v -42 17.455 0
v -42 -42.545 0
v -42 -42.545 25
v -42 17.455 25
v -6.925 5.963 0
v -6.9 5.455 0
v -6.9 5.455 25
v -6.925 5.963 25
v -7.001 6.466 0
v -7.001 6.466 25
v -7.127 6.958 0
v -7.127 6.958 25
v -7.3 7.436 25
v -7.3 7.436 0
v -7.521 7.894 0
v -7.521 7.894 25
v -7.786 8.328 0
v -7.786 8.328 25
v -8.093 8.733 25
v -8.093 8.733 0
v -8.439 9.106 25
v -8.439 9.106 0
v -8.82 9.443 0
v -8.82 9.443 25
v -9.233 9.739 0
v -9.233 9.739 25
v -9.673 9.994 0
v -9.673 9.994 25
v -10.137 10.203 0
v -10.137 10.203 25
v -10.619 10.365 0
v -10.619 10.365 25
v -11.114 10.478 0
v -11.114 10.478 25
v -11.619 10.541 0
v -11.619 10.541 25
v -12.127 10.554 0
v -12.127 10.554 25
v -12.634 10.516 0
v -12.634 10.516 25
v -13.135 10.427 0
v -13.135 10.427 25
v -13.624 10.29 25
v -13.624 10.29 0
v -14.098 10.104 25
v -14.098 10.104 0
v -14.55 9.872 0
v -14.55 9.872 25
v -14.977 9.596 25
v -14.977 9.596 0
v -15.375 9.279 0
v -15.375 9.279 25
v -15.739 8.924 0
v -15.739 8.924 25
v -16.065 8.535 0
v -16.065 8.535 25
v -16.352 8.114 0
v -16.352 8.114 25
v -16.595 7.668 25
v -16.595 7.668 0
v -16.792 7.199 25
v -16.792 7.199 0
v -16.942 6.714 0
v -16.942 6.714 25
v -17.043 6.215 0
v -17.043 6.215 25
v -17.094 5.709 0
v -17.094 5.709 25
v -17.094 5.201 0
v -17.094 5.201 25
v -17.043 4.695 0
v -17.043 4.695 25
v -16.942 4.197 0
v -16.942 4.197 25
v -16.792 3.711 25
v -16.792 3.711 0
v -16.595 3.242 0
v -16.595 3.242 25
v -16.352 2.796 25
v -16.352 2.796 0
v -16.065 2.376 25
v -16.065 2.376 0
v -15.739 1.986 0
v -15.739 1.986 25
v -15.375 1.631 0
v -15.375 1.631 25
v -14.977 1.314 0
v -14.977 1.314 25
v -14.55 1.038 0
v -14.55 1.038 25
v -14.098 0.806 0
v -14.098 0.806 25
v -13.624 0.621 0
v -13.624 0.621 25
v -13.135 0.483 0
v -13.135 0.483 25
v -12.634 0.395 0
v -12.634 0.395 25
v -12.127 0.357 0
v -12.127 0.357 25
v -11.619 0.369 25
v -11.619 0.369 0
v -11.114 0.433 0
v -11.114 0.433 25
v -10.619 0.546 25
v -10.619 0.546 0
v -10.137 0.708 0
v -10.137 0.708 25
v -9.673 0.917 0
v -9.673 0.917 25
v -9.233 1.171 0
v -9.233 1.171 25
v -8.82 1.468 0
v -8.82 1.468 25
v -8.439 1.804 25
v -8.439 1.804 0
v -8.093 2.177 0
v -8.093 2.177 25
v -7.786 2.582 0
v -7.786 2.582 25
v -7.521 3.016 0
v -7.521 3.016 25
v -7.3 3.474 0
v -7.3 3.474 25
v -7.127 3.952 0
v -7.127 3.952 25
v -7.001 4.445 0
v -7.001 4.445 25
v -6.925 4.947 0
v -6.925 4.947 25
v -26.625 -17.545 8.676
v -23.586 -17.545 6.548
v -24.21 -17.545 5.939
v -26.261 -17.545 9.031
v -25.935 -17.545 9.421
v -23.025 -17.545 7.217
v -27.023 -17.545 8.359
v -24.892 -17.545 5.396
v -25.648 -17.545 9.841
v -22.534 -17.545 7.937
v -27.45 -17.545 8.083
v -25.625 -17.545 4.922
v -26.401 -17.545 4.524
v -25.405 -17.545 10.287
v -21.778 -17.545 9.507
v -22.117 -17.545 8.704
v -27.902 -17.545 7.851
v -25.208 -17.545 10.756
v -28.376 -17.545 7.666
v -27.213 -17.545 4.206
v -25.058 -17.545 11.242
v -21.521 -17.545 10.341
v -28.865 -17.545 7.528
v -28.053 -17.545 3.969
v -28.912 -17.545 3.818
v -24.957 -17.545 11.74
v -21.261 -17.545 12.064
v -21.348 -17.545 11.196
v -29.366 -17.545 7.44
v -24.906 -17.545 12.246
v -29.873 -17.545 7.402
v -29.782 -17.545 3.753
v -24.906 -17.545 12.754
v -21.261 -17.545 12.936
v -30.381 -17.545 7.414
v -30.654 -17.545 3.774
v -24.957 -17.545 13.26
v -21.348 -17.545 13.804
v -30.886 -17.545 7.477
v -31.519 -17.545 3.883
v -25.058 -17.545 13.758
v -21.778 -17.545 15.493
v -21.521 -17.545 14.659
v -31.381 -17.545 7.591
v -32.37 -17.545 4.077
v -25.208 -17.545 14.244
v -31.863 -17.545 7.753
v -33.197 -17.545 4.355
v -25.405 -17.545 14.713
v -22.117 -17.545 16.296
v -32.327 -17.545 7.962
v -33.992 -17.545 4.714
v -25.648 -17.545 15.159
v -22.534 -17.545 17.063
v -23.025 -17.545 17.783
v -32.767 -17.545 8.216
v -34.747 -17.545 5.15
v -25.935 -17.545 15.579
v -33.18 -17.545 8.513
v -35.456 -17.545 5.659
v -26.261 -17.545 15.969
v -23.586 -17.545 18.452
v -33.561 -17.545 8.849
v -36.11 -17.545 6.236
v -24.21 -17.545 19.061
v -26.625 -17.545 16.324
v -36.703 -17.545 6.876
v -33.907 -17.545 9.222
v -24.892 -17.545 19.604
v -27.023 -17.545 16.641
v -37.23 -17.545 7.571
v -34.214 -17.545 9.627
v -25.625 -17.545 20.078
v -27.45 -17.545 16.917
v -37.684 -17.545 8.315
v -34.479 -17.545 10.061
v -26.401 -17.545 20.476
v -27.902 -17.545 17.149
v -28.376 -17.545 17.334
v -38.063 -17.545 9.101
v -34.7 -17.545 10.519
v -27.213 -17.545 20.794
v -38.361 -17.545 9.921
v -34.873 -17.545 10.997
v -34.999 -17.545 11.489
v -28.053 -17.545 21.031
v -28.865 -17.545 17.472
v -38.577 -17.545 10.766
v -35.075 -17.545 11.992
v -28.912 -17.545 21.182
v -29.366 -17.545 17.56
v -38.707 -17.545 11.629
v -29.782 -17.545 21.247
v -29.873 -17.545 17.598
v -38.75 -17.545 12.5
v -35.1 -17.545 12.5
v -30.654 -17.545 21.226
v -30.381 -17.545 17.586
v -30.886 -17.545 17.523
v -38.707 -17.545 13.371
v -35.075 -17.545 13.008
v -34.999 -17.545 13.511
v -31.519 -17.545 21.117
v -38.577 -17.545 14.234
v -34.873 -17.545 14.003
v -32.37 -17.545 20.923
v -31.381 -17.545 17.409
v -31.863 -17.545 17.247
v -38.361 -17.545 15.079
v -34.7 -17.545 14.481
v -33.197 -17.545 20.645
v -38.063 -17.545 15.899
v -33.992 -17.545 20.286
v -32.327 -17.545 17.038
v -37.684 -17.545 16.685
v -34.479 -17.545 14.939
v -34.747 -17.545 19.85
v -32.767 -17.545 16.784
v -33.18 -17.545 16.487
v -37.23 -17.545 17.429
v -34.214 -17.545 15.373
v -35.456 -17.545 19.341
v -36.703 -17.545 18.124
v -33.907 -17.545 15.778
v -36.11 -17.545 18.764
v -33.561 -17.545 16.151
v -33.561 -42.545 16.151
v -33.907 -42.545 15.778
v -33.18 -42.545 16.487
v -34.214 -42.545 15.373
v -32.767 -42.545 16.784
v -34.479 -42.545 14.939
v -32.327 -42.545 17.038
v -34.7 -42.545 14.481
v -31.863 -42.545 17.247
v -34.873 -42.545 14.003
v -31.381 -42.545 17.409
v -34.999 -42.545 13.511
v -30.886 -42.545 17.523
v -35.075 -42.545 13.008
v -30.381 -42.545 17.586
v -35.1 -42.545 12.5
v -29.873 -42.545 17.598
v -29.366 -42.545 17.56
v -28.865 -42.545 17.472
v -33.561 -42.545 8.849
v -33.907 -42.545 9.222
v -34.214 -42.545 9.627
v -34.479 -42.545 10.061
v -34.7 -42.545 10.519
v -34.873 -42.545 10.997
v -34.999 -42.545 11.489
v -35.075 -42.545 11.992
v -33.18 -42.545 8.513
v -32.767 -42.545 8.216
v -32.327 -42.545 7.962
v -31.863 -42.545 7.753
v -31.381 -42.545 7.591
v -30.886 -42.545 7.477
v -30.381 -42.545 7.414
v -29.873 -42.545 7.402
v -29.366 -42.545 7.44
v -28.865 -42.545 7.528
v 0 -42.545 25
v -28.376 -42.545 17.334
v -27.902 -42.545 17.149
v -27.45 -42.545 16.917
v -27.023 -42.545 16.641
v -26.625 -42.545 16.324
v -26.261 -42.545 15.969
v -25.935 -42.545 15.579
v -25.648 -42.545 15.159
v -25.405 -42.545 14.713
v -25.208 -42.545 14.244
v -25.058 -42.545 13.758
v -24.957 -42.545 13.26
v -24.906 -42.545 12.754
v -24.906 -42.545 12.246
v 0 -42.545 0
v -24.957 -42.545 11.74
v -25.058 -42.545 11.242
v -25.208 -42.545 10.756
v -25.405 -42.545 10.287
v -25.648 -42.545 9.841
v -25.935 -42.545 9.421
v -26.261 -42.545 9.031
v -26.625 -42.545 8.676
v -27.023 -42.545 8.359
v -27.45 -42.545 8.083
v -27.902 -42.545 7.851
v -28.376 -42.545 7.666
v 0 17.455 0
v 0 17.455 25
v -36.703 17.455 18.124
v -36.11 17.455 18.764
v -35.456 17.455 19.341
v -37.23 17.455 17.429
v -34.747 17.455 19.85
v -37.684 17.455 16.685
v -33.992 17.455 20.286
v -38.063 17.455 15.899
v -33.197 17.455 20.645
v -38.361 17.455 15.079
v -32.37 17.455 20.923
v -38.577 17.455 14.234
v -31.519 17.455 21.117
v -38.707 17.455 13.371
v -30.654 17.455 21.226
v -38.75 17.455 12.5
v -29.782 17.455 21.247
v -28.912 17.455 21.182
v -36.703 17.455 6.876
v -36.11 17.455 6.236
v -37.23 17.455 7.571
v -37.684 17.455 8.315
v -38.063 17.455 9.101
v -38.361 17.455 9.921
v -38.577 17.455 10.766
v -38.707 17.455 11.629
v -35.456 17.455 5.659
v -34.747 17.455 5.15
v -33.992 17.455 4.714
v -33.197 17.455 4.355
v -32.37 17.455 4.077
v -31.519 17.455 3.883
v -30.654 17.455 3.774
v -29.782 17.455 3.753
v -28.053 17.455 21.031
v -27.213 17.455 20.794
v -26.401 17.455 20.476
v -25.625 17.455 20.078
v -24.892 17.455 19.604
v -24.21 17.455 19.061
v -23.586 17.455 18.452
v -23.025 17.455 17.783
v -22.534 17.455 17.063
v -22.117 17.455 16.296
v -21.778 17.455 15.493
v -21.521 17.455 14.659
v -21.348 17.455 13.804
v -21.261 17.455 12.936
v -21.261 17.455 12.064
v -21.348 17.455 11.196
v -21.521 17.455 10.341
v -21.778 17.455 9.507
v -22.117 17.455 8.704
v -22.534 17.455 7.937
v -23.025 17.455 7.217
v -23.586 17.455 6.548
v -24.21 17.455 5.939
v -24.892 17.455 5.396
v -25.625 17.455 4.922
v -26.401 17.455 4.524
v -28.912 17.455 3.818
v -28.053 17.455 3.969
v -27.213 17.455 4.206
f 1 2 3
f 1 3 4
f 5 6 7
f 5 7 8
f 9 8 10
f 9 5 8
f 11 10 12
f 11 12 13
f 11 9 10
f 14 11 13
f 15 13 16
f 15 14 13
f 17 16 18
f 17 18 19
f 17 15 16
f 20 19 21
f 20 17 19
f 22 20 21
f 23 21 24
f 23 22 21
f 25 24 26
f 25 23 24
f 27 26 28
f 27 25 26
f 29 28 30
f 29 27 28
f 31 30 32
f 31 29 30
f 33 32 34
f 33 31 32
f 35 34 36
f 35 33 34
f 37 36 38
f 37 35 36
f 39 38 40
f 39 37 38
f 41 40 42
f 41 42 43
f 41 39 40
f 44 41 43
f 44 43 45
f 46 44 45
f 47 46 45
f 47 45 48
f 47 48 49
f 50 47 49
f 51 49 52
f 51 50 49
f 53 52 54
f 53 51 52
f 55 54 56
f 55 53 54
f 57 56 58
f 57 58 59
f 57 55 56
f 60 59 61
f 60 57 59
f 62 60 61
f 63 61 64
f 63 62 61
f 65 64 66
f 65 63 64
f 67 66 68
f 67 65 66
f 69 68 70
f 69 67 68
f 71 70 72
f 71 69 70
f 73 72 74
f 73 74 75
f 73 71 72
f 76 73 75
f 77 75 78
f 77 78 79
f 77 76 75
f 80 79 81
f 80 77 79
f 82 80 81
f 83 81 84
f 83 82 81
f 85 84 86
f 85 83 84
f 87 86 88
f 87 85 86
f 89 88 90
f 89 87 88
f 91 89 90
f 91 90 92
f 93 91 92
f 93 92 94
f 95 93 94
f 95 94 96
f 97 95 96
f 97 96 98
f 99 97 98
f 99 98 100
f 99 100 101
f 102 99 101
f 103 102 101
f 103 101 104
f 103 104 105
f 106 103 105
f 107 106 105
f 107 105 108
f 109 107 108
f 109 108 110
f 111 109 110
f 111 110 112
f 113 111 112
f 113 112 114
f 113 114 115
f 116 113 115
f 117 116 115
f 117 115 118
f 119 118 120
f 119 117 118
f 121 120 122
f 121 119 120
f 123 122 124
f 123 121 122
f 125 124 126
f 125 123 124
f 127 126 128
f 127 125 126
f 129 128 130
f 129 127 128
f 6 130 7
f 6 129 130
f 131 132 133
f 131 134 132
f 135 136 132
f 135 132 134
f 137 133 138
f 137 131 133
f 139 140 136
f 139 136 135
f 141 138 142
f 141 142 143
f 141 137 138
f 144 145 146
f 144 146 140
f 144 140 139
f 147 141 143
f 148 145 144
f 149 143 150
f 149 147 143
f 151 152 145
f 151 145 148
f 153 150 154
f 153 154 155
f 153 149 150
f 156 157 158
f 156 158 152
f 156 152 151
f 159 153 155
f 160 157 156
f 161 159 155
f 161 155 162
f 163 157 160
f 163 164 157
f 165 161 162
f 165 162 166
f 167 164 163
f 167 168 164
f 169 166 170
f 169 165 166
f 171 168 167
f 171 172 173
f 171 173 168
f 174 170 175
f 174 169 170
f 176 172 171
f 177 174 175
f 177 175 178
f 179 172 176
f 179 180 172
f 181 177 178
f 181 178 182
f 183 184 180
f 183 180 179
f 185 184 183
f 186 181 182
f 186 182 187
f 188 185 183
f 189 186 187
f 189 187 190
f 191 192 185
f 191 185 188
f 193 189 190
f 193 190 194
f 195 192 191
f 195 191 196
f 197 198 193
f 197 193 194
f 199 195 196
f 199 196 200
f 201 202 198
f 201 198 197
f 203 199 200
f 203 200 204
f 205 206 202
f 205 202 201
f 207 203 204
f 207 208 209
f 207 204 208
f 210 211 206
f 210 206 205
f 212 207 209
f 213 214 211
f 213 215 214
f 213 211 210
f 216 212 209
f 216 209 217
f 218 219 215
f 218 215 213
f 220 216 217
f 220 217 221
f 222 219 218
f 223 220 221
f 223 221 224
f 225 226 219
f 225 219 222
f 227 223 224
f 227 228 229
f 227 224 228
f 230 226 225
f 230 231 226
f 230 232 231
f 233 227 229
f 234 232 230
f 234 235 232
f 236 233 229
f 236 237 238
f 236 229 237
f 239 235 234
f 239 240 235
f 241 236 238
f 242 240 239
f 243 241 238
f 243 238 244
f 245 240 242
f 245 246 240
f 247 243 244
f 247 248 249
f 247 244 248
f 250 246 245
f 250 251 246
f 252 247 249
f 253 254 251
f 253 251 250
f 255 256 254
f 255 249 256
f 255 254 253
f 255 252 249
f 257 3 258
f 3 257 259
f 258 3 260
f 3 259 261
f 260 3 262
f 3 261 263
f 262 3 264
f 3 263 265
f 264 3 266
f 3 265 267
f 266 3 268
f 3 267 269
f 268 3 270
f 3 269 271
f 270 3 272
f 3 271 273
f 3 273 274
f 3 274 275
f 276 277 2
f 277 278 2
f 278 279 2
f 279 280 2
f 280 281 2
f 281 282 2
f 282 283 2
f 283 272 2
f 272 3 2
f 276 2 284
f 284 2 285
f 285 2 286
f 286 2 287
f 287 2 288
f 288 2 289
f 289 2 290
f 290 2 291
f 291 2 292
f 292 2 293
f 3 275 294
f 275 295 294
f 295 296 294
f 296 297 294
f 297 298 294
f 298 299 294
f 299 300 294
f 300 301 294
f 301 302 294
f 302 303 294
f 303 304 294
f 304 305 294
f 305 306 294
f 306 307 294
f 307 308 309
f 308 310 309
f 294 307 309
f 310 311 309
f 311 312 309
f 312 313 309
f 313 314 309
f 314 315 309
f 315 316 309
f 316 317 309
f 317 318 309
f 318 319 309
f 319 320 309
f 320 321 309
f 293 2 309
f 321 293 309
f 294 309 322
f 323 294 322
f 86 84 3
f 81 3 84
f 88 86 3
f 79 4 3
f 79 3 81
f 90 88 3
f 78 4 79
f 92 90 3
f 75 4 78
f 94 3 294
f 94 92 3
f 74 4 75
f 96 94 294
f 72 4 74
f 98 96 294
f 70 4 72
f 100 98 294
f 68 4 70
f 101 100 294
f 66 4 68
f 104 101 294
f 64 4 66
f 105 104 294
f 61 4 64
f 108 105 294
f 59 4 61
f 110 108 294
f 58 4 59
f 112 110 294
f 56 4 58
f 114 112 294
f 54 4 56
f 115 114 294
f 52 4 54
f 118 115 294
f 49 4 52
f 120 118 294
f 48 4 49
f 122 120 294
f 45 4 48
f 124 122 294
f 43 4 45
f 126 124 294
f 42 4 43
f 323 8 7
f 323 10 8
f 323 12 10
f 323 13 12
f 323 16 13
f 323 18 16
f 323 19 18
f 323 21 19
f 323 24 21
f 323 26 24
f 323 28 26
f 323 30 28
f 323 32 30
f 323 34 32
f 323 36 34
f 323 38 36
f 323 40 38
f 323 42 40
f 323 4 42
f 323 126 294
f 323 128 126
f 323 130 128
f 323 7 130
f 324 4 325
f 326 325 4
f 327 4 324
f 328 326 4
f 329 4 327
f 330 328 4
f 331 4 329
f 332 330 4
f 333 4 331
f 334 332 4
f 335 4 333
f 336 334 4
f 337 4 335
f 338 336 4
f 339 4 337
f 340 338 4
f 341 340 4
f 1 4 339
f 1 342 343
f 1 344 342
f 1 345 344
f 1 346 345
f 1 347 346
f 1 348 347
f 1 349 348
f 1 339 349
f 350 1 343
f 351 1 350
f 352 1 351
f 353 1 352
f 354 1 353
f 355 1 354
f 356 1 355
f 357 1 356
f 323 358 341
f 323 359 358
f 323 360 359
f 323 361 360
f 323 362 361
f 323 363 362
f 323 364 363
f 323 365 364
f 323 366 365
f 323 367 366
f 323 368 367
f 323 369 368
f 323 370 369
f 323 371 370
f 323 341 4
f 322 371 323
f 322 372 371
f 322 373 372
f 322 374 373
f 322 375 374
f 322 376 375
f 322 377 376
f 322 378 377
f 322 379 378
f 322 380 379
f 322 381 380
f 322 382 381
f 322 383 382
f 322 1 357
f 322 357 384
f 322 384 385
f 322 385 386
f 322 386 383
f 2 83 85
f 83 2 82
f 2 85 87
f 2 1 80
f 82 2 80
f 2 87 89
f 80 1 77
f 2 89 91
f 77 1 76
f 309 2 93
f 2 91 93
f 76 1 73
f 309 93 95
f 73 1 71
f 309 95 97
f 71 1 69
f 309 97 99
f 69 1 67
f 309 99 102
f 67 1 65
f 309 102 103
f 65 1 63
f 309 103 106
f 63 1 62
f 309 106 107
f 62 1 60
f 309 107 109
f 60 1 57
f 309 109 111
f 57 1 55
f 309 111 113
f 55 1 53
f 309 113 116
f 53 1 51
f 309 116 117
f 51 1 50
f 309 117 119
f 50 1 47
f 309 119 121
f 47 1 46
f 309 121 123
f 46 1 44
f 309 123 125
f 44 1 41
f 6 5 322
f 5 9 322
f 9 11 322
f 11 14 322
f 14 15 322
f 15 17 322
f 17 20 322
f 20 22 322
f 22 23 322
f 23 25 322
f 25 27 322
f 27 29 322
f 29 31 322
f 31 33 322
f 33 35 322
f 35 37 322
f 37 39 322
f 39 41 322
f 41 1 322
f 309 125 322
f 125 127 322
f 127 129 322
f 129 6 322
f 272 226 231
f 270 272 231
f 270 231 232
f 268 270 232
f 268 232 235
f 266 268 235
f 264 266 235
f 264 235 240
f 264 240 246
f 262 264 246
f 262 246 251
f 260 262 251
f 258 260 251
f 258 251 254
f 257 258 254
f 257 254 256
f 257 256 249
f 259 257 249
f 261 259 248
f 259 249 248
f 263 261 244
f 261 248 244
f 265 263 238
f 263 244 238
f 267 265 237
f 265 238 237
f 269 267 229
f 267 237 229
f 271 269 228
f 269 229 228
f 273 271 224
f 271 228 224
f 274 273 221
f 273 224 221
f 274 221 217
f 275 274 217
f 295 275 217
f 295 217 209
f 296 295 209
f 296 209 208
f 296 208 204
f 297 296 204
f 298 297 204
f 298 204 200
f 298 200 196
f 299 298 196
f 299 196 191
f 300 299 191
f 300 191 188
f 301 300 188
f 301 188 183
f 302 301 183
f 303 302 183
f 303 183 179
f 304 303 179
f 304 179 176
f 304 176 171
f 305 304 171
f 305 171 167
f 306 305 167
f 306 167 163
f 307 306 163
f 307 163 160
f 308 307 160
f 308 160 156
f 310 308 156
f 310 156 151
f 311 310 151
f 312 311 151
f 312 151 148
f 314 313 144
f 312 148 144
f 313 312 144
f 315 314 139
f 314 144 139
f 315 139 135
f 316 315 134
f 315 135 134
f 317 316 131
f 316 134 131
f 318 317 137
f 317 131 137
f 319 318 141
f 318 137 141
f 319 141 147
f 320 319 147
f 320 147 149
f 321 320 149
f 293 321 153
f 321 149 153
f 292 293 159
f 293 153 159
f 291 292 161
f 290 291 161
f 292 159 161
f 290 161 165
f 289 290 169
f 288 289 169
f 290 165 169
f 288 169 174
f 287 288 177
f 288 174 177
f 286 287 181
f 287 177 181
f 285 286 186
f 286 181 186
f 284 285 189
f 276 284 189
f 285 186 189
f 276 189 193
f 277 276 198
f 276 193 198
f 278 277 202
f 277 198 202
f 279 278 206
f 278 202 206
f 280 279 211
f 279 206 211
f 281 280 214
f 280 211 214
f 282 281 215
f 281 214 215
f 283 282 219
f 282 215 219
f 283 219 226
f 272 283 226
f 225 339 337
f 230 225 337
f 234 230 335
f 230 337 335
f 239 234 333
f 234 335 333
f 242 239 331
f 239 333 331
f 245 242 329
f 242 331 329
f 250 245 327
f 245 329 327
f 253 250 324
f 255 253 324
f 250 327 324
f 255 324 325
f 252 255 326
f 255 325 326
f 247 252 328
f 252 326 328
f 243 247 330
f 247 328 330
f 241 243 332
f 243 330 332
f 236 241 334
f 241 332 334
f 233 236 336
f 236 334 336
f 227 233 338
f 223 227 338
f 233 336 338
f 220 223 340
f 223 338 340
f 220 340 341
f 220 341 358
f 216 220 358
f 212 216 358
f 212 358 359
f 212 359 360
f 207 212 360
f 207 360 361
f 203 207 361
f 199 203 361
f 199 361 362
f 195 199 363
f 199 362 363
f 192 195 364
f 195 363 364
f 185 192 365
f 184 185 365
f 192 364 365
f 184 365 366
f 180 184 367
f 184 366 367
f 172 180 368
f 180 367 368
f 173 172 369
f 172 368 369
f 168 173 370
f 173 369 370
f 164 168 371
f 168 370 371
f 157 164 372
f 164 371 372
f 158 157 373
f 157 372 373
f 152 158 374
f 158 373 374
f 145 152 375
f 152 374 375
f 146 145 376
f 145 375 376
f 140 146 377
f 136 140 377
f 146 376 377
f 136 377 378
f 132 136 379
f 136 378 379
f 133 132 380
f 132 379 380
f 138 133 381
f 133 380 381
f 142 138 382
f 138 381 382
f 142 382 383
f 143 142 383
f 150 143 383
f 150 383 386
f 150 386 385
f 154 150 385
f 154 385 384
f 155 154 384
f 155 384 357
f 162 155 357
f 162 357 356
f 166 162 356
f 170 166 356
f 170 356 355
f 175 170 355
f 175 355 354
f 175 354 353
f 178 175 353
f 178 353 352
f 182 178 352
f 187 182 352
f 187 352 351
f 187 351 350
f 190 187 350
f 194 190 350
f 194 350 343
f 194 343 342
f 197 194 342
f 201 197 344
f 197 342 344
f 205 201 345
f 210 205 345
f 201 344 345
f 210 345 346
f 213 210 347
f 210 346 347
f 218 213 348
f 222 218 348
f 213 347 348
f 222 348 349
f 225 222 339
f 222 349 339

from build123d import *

# Parameters (mm, degrees)
F0_W     = 42
F0_H     = 60
F0_R     = 5.1
F1_DEPTH = 25
F2_R     = 8.75
F2_R_2   = 5.1
F3_DEPTH = 35
F4_DEPTH = 60


with BuildPart() as f1:
    # F0 (on Top) → F1 (new body)
    with BuildSketch(Plane.XY):
        with Locations((-21, -12.544838)):
            Rectangle(F0_W, F0_H)
        with Locations((-12, 5.455162)):
            Circle(F0_R, mode=Mode.SUBTRACT)
    extrude(amount=F1_DEPTH)

    # F2 (on face) → F3 (cut)
    with BuildSketch(Plane(origin=(0, 17.455162, 0), x_dir=(-1, 0, 0), z_dir=(0, 1, 0))):
        with Locations((30, 12.5)):
            Circle(F2_R)
        with Locations((30, 12.5)):
            Circle(F2_R_2, mode=Mode.SUBTRACT)
    extrude(amount=-F3_DEPTH, mode=Mode.SUBTRACT)

    # F2 (on face) → F4 (cut)
    with BuildSketch(Plane(origin=(0, 17.455162, 0), x_dir=(-1, 0, 0), z_dir=(0, 1, 0))):
        with Locations((30, 12.5)):
            Circle(F2_R_2)
    extrude(amount=-F4_DEPTH, mode=Mode.SUBTRACT)


solid = f1.part
